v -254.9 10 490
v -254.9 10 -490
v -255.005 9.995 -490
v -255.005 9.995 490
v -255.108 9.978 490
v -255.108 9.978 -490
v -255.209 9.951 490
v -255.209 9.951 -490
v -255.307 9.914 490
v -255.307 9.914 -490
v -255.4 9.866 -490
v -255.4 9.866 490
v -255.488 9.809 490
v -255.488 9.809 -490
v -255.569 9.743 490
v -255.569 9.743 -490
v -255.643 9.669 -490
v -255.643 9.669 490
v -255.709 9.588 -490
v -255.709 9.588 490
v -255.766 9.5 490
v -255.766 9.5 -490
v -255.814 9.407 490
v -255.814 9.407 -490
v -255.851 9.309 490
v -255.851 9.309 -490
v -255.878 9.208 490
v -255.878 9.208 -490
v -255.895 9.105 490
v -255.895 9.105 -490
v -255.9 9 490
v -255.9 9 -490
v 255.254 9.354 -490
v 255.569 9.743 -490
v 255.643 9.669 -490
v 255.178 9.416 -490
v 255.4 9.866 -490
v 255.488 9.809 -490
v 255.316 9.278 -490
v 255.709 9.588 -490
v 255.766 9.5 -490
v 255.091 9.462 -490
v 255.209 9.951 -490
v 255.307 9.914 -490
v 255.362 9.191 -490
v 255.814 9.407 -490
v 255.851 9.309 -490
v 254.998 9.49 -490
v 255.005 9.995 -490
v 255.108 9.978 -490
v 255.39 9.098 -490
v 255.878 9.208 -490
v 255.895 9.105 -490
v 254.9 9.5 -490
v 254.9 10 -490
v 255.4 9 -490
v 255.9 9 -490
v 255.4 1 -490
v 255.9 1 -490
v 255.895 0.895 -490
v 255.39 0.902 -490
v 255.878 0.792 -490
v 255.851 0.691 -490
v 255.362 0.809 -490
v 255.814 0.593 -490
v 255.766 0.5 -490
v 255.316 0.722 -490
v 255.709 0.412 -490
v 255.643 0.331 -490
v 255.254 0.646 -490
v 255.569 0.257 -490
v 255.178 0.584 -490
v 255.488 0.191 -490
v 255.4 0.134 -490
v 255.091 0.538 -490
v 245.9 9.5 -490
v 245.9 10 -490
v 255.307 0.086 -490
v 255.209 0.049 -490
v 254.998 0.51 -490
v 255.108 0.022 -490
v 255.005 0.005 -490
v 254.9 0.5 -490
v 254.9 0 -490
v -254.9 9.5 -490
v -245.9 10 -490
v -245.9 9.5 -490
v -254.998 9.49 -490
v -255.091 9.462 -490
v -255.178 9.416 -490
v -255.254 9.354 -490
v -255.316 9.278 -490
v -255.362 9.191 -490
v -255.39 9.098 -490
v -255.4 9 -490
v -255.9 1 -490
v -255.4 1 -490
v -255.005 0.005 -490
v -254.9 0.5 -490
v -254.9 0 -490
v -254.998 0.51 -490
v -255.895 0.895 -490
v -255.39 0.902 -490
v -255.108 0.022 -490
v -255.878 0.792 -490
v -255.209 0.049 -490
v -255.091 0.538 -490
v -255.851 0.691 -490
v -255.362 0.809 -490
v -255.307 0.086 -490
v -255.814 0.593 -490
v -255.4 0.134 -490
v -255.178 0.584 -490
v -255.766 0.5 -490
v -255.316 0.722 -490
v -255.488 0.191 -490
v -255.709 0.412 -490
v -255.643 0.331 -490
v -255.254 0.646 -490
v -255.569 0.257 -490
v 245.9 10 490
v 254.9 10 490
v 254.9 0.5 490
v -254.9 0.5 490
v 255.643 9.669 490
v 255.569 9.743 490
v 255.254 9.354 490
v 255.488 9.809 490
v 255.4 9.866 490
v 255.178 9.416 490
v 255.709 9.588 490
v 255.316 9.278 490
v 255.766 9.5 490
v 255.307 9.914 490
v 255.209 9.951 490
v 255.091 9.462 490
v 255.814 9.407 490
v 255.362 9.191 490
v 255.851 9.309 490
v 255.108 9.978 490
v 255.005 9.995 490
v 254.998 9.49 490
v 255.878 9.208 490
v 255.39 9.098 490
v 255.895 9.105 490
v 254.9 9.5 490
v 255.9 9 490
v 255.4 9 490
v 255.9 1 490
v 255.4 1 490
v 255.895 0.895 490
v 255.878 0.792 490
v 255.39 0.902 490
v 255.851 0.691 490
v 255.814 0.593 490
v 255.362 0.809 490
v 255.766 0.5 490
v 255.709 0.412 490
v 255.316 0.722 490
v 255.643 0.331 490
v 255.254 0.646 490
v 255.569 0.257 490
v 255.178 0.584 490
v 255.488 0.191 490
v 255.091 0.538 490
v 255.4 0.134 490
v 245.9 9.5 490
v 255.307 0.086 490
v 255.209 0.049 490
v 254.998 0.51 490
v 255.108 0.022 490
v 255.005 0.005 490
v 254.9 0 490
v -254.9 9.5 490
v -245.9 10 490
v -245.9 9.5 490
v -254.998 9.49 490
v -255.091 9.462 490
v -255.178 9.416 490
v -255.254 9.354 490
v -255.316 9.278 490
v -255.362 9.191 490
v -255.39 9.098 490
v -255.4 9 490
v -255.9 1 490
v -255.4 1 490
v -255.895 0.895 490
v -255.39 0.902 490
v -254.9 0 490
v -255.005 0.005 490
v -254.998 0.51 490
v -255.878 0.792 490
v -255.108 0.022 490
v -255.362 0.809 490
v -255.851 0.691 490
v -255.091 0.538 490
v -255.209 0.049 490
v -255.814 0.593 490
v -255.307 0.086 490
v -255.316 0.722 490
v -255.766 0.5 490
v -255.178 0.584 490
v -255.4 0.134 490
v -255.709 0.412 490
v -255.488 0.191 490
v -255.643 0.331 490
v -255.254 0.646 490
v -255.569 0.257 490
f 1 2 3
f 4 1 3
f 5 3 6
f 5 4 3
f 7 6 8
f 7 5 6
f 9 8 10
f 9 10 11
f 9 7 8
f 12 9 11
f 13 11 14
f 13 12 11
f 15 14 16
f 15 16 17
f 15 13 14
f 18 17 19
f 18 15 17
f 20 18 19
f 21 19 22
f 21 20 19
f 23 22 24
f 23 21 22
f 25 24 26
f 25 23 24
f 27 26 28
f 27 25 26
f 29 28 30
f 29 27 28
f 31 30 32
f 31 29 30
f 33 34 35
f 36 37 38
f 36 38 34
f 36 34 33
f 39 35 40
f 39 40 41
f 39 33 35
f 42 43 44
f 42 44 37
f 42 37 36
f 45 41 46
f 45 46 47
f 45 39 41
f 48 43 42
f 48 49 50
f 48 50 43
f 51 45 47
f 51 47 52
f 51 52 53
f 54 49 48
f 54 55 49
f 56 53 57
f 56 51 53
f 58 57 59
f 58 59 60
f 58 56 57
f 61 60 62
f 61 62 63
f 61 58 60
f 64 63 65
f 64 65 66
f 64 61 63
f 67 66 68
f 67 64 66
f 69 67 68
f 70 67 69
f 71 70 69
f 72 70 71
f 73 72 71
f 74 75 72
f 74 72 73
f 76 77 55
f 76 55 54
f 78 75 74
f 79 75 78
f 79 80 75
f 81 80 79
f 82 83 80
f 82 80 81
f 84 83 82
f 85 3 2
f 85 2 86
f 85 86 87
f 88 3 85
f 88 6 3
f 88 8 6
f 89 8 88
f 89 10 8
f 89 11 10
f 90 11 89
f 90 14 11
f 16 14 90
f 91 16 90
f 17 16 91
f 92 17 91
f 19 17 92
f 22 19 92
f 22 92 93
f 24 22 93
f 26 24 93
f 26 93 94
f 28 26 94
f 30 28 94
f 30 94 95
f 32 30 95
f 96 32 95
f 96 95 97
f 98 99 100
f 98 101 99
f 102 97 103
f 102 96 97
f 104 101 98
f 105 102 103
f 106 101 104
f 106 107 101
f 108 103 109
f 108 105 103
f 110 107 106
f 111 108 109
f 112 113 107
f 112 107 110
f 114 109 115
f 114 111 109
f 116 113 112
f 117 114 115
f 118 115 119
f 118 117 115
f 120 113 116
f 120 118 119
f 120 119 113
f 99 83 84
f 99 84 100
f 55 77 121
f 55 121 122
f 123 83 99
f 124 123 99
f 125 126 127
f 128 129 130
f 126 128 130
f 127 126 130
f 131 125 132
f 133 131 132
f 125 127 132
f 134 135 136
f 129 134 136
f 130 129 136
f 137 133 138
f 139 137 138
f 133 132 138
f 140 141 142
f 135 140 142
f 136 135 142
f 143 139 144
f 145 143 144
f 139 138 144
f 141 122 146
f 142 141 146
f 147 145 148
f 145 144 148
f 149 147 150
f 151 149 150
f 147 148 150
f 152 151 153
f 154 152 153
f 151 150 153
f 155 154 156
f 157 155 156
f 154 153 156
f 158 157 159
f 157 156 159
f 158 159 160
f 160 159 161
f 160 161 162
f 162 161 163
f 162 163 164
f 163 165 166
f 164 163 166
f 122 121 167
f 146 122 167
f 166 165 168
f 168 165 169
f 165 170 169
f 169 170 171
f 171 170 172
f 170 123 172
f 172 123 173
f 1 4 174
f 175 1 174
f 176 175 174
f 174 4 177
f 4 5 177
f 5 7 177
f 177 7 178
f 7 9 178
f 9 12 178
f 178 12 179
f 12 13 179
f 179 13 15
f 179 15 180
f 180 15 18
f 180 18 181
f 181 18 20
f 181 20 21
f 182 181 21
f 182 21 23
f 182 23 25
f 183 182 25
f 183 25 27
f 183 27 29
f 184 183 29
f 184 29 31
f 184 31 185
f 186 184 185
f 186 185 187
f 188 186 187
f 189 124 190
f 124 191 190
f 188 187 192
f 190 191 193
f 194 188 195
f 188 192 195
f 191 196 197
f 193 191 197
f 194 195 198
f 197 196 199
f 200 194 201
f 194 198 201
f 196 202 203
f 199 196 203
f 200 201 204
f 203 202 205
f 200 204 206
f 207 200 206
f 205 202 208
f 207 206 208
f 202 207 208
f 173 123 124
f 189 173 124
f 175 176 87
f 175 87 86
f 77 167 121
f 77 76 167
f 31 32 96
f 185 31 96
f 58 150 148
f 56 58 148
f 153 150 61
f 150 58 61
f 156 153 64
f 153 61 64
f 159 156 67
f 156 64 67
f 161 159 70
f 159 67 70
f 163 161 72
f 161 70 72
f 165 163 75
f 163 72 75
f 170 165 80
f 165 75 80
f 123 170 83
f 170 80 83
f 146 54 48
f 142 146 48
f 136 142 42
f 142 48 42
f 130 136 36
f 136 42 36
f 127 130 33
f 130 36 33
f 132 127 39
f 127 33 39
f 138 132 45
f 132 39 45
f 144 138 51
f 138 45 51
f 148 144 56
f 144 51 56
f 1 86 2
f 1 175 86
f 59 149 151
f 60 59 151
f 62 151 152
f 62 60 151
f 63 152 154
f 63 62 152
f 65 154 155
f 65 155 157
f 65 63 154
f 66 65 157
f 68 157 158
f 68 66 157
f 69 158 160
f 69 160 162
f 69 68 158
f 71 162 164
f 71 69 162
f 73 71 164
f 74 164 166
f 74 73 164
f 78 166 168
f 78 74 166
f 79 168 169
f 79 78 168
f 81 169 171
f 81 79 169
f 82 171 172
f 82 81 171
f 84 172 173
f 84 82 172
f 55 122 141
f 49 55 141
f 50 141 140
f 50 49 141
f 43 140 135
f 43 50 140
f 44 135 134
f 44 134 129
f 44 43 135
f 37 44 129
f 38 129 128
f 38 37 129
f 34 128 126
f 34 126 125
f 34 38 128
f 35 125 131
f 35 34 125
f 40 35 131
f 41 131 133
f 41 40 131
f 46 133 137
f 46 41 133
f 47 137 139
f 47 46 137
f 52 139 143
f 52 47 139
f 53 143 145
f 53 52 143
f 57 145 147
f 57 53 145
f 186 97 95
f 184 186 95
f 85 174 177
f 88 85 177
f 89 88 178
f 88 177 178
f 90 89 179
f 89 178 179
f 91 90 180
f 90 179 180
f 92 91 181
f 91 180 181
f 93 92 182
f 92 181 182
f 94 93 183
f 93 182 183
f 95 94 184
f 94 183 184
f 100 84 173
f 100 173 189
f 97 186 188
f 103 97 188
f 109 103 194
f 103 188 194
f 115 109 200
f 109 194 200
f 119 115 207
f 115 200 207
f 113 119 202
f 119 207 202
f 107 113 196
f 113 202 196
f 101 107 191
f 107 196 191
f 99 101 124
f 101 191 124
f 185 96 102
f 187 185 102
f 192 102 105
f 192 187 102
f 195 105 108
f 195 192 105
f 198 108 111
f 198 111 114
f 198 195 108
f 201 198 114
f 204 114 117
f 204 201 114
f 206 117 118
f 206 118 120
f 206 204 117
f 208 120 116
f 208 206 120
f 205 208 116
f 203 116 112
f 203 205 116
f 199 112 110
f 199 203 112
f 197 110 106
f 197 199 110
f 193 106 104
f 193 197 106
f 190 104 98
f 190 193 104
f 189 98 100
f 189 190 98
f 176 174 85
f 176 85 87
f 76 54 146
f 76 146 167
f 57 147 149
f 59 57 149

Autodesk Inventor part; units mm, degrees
ref_plane "YZ Plane" through (0, 0, 0) normal (1, 0, 0) x (0, 1, 0)
ref_plane "XZ Plane" through (0, 0, 0) normal (0, 1, 0) x (-1, 0, 0)
ref_plane "XY Plane" through (0, 0, 0) normal (0, 0, 1) x (1, 0, 0)
sketch "Sketch6" plane through (0, 0, 0) normal (0, 1, 0) x (-1, 0, 0)
  line L0 (255.9, -490) -> (-255.9, -490)
  line L1 (-255.9, -490) -> (-255.9, 490)
  line L2 (-255.9, 490) -> (255.9, 490)
  line L3 (255.9, 490) -> (255.9, -490)
  line L4 (255.9, -490) -> (-255.9, 490) construction
  line L5 (-255.9, -490) -> (255.9, 490) construction
  point P0 (0, 0)
  dimension "d52" = 511.8
  dimension "d53" = 980
extrude "Plate2" add sketch "Sketch6" along normal blind 0.5
sketch "Sketch11" plane through (-255.4, 0, 490) normal (-1, 0, 0) x (0, -1, 0)
  line L0 (0, -980) -> (0, 0)
  line L1 (0, 0) -> (-10, 0)
  line L2 (-10, 0) -> (-10, -980)
  line L3 (-10, -980) -> (0, -980)
edge flange "Flange2" height 10 angle 90 thickness 0.5 bend radius 0.5 thickness toward (-1, 0, 0) relief tear relief width 0.5 relief depth 0.25 edges at (-255.9, 0.5, 0) wall of the first edge with corners at (-255.4, 0, -490) (-255.4, 0, 490) (-255.4, 10, 490) (-255.4, 10, -490)
bend "Bend3"
corner "Corner3"
sketch "Sketch12" plane through (-255.9, 9.5, 490) normal (0, 1, 0) x (-1, 0, 0)
  line L0 (0, -980) -> (0, 0)
  line L1 (0, 0) -> (-10, 0)
  line L2 (-10, 0) -> (-10, -980)
  line L3 (-10, -980) -> (0, -980)
edge flange "Flange3" height 10 angle 90 thickness 0.5 bend radius 0.5 thickness toward (0, 1, 0) relief tear relief width 0.5 relief depth 0.25 edges at (-255.4, 10, 0) wall of the first edge with corners at (-255.9, 9.5, -490) (-255.9, 9.5, 490) (-245.9, 9.5, 490) (-245.9, 9.5, -490)
bend "Bend4"
corner "Corner4"
sketch "Sketch13" plane through (255.4, 0, -490) normal (1, 0, 0) x (0, 1, 0)
  line L0 (0, 980) -> (0, 0)
  line L1 (0, 0) -> (10, 0)
  line L2 (10, 0) -> (10, 980)
  line L3 (10, 980) -> (0, 980)
edge flange "Flange4" height 10 angle 90 thickness 0.5 bend radius 0.5 thickness toward (1, 0, 0) relief tear relief width 0.5 relief depth 0.25 edges at (255.9, 0.5, 0) wall of the first edge with corners at (255.4, 0, 490) (255.4, 0, -490) (255.4, 10, -490) (255.4, 10, 490)
bend "Bend5"
corner "Corner5"
sketch "Sketch14" plane through (255.9, 9.5, -490) normal (0, 1, 0) x (-1, 0, 0)
  line L0 (0, 980) -> (0, 0)
  line L1 (0, 0) -> (10, 0)
  line L2 (10, 0) -> (10, 980)
  line L3 (10, 980) -> (0, 980)
edge flange "Flange5" height 10 angle 90 thickness 0.5 bend radius 0.5 thickness toward (0, 1, 0) relief tear relief width 0.5 relief depth 0.25 edges at (255.4, 10, 0) wall of the first edge with corners at (255.9, 9.5, 490) (255.9, 9.5, -490) (245.9, 9.5, -490) (245.9, 9.5, 490)
bend "Bend6"
corner "Corner6"
equation "\"d52\" = ЖАБРЫ_базовая_ширина - 4 * ЖАБРЫ_шаг_листов"
equation "\"d53\" = ЖАБРЫ_базовая_длина_кор_лист"
equation "\"d54\" = Thickness"
equation "\"d84\" = BendReliefWidth"
equation "\"d85\" = BendReliefDepth"
equation "\"d86\" = MinimumRemnant"
equation "\"d87\" = TransitionRadius"
equation "\"d90\" = BendRadius"
equation "\"d91\" = CornerReliefSize"
equation "\"d92\" = GapSize"
equation "\"d93\" = JacobiRadiusSize"
equation "\"d94\" = BendReliefWidth"
equation "\"d95\" = BendReliefDepth"
equation "\"d96\" = MinimumRemnant"
equation "\"d97\" = TransitionRadius"
equation "\"d100\" = BendRadius"
equation "\"d101\" = CornerReliefSize"
equation "\"d102\" = GapSize"
equation "\"d103\" = JacobiRadiusSize"
equation "\"d104\" = BendReliefWidth"
equation "\"d105\" = BendReliefDepth"
equation "\"d106\" = MinimumRemnant"
equation "\"d107\" = TransitionRadius"
equation "\"d110\" = BendRadius"
equation "\"d111\" = CornerReliefSize"
equation "\"d112\" = GapSize"
equation "\"d113\" = JacobiRadiusSize"
equation "\"d114\" = BendReliefWidth"
equation "\"d115\" = BendReliefDepth"
equation "\"d116\" = MinimumRemnant"
equation "\"d117\" = TransitionRadius"
equation "\"d120\" = BendRadius"
equation "\"d121\" = CornerReliefSize"
equation "\"d122\" = GapSize"
equation "\"d123\" = JacobiRadiusSize"
equation "\"BendRadius\" = Thickness"
equation "\"BendReliefWidth\" = Thickness"
equation "\"BendReliefDepth\" = 0.5 * Thickness"
equation "\"CornerReliefSize\" = 4 * Thickness"
equation "\"MinimumRemnant\" = 2 * Thickness"
equation "\"TransitionRadius\" = BendRadius"
equation "\"JacobiRadiusSize\" = BendRadius"
equation "\"GapSize\" = Thickness"
equation "\"ЖАБРЫ_базовая_ширина\" = 915"
equation "\"ЖАБРЫ_шаг_листов\" = 100.8"
equation "\"ЖАБРЫ_базовая_длина_кор_лист\" = 980"
equation "\"Thickness\" = 0.5"
properties part number "MSC 809 sheet gills" material "Stainless Steel"
